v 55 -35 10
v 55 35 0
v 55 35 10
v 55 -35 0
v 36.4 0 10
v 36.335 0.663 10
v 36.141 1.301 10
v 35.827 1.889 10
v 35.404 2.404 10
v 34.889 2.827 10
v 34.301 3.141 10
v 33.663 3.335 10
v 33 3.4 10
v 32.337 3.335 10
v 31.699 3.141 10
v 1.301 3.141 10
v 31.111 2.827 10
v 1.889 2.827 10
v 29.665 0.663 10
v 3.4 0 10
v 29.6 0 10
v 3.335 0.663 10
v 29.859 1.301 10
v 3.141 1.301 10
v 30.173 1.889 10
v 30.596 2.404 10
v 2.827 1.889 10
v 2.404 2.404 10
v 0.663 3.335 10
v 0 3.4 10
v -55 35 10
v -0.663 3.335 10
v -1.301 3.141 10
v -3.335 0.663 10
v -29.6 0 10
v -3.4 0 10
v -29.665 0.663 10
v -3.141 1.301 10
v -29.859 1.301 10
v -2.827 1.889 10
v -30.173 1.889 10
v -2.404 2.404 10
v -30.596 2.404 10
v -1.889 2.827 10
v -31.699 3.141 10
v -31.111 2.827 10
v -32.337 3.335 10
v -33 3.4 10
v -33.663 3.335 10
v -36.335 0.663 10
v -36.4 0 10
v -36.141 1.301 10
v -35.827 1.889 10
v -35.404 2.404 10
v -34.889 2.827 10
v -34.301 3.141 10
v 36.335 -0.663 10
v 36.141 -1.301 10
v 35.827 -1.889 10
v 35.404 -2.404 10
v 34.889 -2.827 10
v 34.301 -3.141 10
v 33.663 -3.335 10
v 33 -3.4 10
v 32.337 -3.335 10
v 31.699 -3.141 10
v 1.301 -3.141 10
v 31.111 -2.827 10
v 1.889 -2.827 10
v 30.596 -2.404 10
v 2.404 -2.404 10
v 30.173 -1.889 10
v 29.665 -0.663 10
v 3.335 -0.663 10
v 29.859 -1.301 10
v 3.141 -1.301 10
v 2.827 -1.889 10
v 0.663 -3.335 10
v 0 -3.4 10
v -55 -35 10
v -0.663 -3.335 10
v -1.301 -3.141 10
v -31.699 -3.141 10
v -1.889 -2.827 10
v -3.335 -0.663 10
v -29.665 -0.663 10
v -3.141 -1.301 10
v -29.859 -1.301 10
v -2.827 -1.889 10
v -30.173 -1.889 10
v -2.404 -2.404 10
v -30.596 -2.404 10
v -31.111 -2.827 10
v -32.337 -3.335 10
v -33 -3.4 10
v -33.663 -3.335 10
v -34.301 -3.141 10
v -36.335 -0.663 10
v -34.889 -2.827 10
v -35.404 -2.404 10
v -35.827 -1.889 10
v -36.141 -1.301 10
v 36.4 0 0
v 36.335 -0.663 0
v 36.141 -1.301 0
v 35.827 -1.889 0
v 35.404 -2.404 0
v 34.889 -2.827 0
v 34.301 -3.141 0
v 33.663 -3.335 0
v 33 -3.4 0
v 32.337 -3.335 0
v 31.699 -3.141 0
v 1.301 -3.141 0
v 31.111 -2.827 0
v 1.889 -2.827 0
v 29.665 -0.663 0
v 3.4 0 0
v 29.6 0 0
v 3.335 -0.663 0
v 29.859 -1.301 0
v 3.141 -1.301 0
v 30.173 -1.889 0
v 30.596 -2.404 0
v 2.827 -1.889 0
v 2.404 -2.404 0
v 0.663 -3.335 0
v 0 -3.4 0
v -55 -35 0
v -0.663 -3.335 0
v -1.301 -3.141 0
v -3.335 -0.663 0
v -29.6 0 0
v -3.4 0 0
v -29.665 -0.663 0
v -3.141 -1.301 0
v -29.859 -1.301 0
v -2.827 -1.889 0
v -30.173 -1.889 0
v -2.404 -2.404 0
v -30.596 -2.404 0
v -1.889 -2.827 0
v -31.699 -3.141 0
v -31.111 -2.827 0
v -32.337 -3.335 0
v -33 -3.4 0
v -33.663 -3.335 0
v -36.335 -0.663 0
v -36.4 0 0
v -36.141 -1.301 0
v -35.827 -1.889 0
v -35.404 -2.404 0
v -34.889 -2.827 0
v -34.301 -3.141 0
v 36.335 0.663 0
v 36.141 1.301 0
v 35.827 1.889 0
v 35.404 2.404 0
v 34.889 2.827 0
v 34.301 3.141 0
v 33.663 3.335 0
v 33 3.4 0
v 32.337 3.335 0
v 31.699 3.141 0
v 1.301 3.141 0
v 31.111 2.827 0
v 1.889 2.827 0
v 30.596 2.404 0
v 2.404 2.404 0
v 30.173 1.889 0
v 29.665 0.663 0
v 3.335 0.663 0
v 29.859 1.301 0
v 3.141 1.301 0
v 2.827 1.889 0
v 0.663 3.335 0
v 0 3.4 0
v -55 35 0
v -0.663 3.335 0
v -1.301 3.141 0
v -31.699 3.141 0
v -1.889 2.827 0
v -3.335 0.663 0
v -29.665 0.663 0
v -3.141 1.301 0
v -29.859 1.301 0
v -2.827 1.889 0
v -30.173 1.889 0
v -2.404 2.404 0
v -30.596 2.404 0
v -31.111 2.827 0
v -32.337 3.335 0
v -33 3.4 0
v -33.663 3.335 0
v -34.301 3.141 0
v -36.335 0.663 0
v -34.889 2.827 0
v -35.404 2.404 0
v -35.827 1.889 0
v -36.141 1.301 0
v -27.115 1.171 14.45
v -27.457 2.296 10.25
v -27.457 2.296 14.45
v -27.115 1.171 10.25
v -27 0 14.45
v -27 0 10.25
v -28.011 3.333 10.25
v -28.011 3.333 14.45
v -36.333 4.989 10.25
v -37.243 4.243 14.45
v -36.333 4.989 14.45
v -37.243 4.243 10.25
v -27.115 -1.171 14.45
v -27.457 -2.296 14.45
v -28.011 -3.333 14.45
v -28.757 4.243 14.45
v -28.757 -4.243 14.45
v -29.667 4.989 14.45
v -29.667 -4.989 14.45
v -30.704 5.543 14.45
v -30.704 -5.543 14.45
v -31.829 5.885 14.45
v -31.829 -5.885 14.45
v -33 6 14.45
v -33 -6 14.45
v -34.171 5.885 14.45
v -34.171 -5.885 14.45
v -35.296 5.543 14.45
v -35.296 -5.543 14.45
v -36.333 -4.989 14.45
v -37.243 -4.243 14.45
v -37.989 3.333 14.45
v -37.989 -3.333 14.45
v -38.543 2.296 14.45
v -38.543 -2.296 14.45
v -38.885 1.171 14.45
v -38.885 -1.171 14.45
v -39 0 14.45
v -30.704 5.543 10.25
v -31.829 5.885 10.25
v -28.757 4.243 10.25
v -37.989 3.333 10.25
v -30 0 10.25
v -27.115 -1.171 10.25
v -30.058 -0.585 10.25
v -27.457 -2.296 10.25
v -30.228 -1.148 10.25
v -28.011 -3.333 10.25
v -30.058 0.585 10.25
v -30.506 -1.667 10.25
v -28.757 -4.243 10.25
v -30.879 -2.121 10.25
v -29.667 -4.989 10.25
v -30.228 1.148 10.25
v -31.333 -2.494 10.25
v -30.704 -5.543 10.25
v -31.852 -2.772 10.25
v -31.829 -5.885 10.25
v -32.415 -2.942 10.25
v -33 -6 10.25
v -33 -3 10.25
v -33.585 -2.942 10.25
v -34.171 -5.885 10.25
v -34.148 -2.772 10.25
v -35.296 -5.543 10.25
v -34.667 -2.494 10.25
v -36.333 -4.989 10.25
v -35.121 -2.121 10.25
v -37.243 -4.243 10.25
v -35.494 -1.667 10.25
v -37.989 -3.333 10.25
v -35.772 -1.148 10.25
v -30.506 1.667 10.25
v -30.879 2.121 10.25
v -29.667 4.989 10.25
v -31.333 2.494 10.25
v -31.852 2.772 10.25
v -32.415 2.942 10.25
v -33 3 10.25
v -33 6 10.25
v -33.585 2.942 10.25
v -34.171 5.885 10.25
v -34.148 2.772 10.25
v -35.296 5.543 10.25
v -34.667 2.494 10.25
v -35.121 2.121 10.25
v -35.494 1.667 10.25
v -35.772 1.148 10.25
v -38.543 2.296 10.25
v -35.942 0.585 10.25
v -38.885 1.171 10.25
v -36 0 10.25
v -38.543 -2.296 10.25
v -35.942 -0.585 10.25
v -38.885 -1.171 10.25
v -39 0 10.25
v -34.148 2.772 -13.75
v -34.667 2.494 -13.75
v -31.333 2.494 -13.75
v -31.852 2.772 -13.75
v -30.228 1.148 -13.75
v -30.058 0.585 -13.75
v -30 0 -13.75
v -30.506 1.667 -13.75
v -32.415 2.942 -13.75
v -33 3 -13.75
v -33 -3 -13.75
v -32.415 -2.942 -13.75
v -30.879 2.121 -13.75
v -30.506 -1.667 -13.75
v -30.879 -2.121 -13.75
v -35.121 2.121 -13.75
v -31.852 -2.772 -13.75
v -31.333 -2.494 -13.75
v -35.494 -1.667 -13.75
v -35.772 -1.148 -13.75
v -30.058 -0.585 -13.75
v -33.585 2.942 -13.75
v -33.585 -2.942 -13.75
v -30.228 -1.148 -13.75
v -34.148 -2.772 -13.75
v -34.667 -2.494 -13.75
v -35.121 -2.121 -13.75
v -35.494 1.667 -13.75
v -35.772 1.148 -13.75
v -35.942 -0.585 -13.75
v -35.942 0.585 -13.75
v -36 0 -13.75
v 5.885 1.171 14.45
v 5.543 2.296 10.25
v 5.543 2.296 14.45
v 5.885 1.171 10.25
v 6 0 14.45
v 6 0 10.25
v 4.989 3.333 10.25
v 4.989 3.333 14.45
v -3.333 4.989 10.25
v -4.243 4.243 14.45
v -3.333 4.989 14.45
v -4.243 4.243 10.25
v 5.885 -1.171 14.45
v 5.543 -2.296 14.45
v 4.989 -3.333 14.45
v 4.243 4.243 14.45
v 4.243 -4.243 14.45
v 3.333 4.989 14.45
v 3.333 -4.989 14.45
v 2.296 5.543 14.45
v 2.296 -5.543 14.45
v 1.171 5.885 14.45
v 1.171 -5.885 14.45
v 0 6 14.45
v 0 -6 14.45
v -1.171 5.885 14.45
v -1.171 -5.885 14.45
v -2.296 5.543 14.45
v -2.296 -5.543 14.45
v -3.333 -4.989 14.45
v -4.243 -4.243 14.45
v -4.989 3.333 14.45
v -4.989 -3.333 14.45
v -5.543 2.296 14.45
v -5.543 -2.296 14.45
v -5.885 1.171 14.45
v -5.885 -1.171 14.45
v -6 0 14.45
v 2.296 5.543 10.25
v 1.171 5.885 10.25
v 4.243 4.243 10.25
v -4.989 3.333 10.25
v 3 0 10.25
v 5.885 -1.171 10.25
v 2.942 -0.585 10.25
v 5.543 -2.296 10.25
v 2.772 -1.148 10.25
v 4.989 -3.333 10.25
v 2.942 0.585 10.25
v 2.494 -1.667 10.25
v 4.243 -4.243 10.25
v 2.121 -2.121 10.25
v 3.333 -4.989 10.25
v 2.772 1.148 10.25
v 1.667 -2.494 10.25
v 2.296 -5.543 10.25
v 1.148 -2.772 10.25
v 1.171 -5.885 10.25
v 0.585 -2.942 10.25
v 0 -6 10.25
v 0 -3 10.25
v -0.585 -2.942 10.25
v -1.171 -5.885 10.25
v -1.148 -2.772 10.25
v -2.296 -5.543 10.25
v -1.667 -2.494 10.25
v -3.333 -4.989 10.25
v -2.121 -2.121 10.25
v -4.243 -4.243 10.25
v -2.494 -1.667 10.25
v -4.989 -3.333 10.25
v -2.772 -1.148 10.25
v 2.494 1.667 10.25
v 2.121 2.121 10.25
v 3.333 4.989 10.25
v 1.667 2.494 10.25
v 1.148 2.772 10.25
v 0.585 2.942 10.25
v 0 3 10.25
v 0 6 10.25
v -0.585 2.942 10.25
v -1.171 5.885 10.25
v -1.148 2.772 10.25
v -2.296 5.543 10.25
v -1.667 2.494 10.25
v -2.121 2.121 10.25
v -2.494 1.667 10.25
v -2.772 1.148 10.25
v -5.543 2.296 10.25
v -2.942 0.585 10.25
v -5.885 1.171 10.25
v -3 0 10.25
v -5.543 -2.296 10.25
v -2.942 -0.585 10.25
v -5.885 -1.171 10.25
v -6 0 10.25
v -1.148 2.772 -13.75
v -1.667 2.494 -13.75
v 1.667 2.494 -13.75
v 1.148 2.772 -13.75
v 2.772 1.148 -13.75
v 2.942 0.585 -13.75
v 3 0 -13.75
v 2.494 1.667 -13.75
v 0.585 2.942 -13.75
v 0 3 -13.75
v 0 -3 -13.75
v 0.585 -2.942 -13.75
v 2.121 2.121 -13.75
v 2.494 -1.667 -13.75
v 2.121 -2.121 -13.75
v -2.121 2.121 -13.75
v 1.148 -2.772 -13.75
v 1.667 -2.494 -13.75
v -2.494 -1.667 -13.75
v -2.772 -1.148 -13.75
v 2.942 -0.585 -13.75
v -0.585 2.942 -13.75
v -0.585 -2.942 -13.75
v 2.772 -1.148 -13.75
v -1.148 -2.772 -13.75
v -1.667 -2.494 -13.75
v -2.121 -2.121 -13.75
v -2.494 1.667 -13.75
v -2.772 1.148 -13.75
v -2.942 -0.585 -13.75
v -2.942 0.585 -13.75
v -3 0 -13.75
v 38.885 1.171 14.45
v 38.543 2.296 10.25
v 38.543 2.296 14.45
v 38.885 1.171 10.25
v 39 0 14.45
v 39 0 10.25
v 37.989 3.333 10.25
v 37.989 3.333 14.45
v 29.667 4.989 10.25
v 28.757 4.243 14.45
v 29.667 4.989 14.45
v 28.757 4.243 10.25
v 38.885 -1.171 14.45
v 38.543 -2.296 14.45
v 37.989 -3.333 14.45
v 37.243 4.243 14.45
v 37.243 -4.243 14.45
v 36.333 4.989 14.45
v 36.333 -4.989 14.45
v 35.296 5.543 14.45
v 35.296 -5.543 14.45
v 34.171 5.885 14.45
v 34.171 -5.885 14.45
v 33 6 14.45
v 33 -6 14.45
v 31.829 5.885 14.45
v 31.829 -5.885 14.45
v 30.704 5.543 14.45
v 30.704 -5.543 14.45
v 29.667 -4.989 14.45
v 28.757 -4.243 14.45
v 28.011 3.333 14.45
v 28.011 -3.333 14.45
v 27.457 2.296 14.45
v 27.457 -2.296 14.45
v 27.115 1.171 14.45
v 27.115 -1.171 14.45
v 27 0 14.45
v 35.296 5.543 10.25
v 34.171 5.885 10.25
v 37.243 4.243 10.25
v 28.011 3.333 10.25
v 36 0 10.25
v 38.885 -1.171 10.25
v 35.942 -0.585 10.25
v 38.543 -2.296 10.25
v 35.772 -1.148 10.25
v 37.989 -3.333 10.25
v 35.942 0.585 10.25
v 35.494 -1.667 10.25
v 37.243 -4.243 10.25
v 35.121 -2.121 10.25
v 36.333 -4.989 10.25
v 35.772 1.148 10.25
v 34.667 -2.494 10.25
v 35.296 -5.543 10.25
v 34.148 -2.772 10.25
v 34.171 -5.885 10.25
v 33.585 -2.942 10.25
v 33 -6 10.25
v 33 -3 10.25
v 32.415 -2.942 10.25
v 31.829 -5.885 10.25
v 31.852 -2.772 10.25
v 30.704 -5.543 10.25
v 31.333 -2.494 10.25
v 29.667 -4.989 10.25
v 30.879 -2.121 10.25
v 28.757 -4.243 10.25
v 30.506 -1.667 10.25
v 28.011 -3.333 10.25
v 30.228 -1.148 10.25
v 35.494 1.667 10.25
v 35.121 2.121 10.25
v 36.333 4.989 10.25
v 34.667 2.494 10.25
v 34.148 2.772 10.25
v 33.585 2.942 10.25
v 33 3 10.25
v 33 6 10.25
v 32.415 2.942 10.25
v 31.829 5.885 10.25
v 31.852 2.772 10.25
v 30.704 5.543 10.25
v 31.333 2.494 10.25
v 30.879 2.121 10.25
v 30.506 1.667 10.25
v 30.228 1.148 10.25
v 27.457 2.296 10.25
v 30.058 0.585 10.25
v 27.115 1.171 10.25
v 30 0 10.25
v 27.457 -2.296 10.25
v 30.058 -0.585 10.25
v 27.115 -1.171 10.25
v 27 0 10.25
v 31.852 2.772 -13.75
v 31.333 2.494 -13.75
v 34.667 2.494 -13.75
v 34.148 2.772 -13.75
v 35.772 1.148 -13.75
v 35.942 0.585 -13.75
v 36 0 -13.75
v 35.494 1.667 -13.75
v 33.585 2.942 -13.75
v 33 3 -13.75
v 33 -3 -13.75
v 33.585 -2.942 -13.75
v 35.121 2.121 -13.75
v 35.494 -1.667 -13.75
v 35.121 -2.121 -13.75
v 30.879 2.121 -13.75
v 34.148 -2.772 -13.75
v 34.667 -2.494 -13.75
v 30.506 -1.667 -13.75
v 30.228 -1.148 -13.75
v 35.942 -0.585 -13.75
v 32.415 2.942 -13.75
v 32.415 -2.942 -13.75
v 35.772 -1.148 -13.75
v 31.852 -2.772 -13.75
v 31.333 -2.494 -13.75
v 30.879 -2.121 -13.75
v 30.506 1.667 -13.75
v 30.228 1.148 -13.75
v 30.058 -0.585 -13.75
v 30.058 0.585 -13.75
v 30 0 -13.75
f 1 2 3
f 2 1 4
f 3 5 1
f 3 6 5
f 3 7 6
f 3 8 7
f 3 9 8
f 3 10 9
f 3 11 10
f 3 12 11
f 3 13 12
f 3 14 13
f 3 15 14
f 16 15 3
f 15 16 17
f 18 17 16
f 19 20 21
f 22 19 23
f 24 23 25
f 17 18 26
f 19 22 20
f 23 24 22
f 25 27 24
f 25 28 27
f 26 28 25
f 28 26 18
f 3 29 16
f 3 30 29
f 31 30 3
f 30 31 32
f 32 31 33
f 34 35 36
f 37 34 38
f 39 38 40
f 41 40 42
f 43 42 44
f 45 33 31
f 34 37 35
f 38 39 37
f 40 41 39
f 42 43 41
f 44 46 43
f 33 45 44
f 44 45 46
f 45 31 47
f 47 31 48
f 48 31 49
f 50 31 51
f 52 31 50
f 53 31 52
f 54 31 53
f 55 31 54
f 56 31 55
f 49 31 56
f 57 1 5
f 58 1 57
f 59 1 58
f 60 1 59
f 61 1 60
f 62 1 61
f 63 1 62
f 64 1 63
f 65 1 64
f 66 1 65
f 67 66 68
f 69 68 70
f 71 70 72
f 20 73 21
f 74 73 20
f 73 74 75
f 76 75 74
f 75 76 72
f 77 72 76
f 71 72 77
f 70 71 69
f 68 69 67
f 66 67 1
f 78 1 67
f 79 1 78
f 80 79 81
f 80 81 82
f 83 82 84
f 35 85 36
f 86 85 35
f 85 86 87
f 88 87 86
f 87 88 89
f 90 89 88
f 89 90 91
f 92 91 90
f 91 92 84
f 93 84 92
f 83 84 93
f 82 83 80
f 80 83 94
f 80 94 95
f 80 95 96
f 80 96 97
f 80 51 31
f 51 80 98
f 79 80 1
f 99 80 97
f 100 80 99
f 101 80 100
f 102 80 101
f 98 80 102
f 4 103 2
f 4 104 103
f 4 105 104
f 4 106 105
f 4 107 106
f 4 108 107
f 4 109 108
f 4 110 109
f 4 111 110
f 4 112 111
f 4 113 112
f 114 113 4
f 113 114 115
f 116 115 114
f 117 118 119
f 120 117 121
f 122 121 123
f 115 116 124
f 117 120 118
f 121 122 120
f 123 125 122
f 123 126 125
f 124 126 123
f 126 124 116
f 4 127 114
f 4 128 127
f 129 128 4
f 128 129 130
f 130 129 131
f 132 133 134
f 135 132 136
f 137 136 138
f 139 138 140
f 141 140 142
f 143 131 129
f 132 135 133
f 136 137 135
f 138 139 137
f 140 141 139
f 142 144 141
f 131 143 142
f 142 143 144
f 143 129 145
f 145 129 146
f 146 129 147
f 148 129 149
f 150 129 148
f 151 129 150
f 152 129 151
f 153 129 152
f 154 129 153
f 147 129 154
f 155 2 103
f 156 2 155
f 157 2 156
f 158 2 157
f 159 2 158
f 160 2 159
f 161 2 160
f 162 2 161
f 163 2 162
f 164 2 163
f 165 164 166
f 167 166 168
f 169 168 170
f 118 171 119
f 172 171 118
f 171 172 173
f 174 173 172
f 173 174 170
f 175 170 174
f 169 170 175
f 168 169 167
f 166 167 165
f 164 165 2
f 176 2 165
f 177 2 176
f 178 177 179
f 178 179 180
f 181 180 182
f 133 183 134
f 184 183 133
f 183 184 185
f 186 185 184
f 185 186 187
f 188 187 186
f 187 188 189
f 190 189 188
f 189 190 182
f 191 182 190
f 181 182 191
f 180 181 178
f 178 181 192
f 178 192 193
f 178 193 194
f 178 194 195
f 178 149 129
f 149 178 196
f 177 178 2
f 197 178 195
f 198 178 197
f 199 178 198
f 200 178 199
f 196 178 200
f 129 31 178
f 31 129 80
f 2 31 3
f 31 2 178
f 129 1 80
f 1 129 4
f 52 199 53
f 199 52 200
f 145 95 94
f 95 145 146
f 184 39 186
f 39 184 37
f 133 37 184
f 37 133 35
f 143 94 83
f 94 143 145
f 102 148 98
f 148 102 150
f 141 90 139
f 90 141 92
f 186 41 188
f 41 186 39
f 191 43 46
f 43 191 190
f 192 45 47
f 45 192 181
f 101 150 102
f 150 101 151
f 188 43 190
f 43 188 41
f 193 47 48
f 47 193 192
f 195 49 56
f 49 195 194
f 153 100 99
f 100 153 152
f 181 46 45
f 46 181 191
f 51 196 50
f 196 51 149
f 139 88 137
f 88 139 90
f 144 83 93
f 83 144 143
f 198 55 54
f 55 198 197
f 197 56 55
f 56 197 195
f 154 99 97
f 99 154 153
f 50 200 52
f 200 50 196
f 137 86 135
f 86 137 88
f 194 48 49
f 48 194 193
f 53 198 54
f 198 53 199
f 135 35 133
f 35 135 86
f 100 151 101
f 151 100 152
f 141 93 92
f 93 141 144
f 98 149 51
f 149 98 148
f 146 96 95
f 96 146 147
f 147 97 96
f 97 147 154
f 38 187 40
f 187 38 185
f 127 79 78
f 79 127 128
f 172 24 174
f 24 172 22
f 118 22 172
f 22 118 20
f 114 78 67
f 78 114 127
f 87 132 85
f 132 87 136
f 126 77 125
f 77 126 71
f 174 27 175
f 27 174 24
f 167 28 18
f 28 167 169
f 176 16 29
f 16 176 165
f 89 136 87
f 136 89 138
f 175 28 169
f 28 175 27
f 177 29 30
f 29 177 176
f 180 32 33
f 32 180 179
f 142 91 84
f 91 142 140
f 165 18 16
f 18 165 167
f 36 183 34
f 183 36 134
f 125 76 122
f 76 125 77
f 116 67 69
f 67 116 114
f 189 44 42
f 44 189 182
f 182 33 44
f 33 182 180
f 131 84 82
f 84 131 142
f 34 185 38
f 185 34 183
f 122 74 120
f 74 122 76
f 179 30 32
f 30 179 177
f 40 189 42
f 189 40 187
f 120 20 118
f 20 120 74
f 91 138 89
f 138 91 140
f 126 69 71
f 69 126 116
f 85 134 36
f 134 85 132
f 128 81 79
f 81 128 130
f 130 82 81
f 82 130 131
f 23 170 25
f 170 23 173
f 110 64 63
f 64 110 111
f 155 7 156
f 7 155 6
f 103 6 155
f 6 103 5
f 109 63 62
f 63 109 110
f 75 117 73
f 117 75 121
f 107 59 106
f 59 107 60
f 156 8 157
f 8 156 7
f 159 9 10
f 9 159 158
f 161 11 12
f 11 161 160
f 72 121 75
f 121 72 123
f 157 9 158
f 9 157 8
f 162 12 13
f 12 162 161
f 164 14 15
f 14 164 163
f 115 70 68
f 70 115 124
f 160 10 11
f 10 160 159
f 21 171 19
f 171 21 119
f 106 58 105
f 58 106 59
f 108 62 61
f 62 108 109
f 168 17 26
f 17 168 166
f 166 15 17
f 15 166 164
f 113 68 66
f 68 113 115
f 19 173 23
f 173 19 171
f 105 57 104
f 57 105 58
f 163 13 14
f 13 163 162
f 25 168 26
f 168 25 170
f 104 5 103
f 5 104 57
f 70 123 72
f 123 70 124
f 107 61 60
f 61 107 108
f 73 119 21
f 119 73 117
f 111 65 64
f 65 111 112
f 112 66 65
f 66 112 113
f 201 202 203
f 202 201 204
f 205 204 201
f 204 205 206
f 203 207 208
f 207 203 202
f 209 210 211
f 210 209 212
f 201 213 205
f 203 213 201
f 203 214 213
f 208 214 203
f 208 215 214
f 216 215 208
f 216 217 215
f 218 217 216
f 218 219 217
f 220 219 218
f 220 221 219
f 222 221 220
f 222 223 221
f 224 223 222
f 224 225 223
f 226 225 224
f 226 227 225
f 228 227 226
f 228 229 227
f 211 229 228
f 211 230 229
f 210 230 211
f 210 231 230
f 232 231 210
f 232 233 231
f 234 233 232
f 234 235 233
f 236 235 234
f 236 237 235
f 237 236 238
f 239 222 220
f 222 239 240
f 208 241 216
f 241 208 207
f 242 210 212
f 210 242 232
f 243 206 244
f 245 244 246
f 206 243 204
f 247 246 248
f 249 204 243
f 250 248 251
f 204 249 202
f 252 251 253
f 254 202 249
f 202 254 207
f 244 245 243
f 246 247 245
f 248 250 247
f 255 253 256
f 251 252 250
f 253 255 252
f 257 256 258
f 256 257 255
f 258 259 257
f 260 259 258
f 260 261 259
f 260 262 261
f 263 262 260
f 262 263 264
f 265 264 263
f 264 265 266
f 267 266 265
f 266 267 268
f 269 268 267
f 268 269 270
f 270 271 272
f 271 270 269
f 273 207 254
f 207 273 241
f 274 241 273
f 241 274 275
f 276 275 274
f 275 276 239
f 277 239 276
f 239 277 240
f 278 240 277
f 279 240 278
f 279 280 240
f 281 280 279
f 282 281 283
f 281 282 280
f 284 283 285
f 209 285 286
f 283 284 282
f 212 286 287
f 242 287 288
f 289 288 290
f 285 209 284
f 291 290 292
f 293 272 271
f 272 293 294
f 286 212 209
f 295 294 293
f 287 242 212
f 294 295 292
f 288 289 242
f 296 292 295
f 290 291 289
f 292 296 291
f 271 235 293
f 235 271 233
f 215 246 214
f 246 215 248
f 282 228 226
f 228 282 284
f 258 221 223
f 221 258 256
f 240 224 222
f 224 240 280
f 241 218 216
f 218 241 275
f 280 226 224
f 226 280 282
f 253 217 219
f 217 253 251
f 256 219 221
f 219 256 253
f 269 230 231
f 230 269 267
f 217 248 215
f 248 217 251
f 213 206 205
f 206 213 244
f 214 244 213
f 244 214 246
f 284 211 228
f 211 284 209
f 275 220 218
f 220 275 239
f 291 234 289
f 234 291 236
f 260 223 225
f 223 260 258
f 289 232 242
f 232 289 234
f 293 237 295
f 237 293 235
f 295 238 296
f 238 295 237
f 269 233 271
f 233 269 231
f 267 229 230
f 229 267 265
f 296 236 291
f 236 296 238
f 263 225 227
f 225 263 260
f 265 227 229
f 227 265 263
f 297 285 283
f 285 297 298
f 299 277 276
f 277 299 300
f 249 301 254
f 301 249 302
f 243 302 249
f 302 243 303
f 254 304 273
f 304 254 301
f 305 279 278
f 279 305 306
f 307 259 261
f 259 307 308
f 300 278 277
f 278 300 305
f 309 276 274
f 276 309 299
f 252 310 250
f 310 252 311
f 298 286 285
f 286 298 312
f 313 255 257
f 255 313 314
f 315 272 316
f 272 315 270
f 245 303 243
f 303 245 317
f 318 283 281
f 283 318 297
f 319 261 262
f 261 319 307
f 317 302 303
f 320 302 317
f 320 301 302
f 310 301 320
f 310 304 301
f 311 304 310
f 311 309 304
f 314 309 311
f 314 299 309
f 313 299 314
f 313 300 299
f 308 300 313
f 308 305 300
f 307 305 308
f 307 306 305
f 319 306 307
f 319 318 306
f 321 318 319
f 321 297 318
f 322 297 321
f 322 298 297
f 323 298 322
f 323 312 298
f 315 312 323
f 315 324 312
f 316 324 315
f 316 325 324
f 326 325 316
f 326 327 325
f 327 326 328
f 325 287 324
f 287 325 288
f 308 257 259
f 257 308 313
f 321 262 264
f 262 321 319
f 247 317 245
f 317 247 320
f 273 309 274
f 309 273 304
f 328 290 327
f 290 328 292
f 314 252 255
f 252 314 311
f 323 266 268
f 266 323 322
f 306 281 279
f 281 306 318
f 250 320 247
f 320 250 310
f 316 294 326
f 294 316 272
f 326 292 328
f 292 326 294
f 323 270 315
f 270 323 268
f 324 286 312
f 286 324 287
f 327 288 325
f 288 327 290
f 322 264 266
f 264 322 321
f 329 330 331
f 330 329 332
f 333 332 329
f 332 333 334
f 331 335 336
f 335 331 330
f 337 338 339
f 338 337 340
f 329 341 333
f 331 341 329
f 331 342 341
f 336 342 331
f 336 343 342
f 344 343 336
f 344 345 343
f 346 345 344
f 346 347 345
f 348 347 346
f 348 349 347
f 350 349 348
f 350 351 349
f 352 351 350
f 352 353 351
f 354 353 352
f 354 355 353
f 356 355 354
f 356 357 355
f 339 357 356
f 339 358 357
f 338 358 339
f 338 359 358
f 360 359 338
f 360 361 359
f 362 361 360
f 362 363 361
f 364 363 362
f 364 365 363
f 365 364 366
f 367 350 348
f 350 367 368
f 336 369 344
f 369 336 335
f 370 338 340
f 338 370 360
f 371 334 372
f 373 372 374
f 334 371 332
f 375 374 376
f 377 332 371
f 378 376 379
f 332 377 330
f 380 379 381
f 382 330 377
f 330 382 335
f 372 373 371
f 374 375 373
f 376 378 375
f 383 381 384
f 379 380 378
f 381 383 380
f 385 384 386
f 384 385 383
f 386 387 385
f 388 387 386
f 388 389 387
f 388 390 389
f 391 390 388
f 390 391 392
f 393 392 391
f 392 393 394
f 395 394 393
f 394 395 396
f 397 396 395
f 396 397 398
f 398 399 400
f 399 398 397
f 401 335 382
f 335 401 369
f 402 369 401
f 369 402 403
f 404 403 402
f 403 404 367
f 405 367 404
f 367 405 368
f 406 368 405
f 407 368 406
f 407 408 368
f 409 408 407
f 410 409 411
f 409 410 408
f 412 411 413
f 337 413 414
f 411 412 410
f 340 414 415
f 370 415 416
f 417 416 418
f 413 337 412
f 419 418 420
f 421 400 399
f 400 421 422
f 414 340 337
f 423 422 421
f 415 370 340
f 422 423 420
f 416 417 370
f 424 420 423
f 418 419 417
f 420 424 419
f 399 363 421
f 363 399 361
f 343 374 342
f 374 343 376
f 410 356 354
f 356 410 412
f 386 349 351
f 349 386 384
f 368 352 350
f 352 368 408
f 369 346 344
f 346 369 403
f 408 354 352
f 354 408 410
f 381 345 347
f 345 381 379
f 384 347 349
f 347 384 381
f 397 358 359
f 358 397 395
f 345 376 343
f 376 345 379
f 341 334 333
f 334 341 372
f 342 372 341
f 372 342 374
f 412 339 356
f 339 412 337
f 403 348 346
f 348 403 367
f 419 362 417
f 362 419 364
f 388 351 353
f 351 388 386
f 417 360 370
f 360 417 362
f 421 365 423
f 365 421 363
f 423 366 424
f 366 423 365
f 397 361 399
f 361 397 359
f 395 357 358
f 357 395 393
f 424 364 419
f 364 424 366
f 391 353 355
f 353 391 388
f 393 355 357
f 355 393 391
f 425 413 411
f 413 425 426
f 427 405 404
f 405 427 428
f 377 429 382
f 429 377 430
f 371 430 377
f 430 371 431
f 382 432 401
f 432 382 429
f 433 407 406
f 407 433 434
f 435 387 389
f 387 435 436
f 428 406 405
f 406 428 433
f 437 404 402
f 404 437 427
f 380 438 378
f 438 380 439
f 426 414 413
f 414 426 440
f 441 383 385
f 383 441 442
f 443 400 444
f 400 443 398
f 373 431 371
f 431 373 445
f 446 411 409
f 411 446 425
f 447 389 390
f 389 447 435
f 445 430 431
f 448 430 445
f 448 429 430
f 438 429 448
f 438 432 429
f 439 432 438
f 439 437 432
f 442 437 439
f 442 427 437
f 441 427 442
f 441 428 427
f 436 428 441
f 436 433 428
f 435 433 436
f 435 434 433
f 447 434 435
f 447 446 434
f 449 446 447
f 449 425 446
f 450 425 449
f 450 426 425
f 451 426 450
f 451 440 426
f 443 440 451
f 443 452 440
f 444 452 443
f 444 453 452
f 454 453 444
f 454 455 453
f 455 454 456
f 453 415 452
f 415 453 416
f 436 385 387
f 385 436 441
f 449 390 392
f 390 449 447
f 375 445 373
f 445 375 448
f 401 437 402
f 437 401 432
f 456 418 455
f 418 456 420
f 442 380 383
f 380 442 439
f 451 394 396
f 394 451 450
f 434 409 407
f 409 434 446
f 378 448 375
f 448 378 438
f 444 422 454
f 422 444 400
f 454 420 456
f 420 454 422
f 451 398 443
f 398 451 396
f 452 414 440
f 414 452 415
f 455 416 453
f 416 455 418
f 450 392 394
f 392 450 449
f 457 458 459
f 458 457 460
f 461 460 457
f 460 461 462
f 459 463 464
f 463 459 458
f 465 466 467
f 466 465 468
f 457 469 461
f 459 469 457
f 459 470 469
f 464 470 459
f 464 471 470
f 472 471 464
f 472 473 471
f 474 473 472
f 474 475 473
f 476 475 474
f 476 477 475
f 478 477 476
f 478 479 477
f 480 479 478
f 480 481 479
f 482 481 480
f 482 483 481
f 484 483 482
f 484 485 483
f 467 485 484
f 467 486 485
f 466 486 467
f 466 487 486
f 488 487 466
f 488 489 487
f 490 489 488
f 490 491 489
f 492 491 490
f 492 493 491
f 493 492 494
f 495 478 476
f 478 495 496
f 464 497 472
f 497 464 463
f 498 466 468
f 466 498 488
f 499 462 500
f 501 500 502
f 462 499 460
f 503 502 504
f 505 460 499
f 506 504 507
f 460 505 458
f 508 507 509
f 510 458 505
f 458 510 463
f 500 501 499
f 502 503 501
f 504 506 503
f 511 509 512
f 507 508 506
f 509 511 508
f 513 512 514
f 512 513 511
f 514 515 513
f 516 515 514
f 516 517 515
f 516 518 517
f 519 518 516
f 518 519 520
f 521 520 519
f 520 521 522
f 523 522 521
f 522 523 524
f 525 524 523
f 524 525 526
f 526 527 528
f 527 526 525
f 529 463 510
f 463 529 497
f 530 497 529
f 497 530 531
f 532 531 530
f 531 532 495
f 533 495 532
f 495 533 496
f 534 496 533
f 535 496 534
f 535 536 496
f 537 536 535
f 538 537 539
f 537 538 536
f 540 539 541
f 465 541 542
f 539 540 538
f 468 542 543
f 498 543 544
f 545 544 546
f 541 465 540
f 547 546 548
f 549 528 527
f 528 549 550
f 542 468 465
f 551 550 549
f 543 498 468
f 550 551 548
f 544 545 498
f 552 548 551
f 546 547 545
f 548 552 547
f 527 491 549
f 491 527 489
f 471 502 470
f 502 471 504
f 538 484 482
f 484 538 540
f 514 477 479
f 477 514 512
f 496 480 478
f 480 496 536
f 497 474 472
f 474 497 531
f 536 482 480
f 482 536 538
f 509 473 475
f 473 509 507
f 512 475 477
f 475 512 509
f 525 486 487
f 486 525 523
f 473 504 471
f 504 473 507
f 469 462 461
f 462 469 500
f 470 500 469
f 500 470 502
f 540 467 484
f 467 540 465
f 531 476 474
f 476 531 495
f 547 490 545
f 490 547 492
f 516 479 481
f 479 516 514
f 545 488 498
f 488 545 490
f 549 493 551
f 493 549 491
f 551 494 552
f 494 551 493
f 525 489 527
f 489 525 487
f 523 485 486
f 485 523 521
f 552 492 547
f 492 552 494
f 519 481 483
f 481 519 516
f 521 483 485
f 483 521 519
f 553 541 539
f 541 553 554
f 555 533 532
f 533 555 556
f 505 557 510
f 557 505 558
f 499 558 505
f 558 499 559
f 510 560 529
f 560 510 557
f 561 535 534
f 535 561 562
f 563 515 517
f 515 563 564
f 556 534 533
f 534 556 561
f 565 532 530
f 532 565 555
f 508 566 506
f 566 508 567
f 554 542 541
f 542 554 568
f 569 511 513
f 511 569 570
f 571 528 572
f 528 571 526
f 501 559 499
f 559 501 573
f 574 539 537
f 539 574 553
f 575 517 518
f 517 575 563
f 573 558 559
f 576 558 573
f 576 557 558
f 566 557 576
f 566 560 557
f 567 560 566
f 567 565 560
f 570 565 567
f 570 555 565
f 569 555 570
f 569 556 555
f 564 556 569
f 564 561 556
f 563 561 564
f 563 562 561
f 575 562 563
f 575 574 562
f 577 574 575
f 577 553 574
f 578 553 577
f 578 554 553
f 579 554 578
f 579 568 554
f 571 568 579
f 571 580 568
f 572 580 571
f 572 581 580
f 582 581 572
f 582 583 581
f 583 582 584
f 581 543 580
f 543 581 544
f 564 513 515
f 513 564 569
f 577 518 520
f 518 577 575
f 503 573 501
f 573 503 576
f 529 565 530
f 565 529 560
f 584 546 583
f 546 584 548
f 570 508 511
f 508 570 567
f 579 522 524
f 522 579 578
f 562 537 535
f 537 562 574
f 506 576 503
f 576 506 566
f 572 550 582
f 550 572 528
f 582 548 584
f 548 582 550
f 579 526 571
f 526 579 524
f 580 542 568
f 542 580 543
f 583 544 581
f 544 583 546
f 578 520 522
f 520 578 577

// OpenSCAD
$fn = 32;

// ------------------------------------------------------------------------
// Bolted plate: 110 x 70 x 10 mm plate, 3 fasteners
// Every part is its own module, assembly() places them once.
// ------------------------------------------------------------------------

// --- part 1 ---
module plate() {
  difference() {
    translate([-55, -35, 0]) cube([110, 70, 10]);
    translate([-33, 0, -1]) cylinder(h = 12, d = 6.8);
    translate([0, 0, -1]) cylinder(h = 12, d = 6.8);
    translate([33, 0, -1]) cylinder(h = 12, d = 6.8);
  }
}

// --- part 2 ---
module bolt1() {
  cylinder(h = 4.2, d = 12);
  translate([0, 0, -24]) cylinder(h = 24, d = 6);
}

// --- part 3 ---
module bolt2() {
  cylinder(h = 4.2, d = 12);
  translate([0, 0, -24]) cylinder(h = 24, d = 6);
}

// --- part 4 ---
module bolt3() {
  cylinder(h = 4.2, d = 12);
  translate([0, 0, -24]) cylinder(h = 24, d = 6);
}

// --- assembly ---
module assembly() {
  translate([0, 0, 0]) rotate([0, 0, 0]) plate();
  translate([-33, 0, 10.25]) rotate([0, 0, 0]) bolt1();
  translate([0, 0, 10.25]) rotate([0, 0, 0]) bolt2();
  translate([33, 0, 10.25]) rotate([0, 0, 0]) bolt3();
}

assembly();
